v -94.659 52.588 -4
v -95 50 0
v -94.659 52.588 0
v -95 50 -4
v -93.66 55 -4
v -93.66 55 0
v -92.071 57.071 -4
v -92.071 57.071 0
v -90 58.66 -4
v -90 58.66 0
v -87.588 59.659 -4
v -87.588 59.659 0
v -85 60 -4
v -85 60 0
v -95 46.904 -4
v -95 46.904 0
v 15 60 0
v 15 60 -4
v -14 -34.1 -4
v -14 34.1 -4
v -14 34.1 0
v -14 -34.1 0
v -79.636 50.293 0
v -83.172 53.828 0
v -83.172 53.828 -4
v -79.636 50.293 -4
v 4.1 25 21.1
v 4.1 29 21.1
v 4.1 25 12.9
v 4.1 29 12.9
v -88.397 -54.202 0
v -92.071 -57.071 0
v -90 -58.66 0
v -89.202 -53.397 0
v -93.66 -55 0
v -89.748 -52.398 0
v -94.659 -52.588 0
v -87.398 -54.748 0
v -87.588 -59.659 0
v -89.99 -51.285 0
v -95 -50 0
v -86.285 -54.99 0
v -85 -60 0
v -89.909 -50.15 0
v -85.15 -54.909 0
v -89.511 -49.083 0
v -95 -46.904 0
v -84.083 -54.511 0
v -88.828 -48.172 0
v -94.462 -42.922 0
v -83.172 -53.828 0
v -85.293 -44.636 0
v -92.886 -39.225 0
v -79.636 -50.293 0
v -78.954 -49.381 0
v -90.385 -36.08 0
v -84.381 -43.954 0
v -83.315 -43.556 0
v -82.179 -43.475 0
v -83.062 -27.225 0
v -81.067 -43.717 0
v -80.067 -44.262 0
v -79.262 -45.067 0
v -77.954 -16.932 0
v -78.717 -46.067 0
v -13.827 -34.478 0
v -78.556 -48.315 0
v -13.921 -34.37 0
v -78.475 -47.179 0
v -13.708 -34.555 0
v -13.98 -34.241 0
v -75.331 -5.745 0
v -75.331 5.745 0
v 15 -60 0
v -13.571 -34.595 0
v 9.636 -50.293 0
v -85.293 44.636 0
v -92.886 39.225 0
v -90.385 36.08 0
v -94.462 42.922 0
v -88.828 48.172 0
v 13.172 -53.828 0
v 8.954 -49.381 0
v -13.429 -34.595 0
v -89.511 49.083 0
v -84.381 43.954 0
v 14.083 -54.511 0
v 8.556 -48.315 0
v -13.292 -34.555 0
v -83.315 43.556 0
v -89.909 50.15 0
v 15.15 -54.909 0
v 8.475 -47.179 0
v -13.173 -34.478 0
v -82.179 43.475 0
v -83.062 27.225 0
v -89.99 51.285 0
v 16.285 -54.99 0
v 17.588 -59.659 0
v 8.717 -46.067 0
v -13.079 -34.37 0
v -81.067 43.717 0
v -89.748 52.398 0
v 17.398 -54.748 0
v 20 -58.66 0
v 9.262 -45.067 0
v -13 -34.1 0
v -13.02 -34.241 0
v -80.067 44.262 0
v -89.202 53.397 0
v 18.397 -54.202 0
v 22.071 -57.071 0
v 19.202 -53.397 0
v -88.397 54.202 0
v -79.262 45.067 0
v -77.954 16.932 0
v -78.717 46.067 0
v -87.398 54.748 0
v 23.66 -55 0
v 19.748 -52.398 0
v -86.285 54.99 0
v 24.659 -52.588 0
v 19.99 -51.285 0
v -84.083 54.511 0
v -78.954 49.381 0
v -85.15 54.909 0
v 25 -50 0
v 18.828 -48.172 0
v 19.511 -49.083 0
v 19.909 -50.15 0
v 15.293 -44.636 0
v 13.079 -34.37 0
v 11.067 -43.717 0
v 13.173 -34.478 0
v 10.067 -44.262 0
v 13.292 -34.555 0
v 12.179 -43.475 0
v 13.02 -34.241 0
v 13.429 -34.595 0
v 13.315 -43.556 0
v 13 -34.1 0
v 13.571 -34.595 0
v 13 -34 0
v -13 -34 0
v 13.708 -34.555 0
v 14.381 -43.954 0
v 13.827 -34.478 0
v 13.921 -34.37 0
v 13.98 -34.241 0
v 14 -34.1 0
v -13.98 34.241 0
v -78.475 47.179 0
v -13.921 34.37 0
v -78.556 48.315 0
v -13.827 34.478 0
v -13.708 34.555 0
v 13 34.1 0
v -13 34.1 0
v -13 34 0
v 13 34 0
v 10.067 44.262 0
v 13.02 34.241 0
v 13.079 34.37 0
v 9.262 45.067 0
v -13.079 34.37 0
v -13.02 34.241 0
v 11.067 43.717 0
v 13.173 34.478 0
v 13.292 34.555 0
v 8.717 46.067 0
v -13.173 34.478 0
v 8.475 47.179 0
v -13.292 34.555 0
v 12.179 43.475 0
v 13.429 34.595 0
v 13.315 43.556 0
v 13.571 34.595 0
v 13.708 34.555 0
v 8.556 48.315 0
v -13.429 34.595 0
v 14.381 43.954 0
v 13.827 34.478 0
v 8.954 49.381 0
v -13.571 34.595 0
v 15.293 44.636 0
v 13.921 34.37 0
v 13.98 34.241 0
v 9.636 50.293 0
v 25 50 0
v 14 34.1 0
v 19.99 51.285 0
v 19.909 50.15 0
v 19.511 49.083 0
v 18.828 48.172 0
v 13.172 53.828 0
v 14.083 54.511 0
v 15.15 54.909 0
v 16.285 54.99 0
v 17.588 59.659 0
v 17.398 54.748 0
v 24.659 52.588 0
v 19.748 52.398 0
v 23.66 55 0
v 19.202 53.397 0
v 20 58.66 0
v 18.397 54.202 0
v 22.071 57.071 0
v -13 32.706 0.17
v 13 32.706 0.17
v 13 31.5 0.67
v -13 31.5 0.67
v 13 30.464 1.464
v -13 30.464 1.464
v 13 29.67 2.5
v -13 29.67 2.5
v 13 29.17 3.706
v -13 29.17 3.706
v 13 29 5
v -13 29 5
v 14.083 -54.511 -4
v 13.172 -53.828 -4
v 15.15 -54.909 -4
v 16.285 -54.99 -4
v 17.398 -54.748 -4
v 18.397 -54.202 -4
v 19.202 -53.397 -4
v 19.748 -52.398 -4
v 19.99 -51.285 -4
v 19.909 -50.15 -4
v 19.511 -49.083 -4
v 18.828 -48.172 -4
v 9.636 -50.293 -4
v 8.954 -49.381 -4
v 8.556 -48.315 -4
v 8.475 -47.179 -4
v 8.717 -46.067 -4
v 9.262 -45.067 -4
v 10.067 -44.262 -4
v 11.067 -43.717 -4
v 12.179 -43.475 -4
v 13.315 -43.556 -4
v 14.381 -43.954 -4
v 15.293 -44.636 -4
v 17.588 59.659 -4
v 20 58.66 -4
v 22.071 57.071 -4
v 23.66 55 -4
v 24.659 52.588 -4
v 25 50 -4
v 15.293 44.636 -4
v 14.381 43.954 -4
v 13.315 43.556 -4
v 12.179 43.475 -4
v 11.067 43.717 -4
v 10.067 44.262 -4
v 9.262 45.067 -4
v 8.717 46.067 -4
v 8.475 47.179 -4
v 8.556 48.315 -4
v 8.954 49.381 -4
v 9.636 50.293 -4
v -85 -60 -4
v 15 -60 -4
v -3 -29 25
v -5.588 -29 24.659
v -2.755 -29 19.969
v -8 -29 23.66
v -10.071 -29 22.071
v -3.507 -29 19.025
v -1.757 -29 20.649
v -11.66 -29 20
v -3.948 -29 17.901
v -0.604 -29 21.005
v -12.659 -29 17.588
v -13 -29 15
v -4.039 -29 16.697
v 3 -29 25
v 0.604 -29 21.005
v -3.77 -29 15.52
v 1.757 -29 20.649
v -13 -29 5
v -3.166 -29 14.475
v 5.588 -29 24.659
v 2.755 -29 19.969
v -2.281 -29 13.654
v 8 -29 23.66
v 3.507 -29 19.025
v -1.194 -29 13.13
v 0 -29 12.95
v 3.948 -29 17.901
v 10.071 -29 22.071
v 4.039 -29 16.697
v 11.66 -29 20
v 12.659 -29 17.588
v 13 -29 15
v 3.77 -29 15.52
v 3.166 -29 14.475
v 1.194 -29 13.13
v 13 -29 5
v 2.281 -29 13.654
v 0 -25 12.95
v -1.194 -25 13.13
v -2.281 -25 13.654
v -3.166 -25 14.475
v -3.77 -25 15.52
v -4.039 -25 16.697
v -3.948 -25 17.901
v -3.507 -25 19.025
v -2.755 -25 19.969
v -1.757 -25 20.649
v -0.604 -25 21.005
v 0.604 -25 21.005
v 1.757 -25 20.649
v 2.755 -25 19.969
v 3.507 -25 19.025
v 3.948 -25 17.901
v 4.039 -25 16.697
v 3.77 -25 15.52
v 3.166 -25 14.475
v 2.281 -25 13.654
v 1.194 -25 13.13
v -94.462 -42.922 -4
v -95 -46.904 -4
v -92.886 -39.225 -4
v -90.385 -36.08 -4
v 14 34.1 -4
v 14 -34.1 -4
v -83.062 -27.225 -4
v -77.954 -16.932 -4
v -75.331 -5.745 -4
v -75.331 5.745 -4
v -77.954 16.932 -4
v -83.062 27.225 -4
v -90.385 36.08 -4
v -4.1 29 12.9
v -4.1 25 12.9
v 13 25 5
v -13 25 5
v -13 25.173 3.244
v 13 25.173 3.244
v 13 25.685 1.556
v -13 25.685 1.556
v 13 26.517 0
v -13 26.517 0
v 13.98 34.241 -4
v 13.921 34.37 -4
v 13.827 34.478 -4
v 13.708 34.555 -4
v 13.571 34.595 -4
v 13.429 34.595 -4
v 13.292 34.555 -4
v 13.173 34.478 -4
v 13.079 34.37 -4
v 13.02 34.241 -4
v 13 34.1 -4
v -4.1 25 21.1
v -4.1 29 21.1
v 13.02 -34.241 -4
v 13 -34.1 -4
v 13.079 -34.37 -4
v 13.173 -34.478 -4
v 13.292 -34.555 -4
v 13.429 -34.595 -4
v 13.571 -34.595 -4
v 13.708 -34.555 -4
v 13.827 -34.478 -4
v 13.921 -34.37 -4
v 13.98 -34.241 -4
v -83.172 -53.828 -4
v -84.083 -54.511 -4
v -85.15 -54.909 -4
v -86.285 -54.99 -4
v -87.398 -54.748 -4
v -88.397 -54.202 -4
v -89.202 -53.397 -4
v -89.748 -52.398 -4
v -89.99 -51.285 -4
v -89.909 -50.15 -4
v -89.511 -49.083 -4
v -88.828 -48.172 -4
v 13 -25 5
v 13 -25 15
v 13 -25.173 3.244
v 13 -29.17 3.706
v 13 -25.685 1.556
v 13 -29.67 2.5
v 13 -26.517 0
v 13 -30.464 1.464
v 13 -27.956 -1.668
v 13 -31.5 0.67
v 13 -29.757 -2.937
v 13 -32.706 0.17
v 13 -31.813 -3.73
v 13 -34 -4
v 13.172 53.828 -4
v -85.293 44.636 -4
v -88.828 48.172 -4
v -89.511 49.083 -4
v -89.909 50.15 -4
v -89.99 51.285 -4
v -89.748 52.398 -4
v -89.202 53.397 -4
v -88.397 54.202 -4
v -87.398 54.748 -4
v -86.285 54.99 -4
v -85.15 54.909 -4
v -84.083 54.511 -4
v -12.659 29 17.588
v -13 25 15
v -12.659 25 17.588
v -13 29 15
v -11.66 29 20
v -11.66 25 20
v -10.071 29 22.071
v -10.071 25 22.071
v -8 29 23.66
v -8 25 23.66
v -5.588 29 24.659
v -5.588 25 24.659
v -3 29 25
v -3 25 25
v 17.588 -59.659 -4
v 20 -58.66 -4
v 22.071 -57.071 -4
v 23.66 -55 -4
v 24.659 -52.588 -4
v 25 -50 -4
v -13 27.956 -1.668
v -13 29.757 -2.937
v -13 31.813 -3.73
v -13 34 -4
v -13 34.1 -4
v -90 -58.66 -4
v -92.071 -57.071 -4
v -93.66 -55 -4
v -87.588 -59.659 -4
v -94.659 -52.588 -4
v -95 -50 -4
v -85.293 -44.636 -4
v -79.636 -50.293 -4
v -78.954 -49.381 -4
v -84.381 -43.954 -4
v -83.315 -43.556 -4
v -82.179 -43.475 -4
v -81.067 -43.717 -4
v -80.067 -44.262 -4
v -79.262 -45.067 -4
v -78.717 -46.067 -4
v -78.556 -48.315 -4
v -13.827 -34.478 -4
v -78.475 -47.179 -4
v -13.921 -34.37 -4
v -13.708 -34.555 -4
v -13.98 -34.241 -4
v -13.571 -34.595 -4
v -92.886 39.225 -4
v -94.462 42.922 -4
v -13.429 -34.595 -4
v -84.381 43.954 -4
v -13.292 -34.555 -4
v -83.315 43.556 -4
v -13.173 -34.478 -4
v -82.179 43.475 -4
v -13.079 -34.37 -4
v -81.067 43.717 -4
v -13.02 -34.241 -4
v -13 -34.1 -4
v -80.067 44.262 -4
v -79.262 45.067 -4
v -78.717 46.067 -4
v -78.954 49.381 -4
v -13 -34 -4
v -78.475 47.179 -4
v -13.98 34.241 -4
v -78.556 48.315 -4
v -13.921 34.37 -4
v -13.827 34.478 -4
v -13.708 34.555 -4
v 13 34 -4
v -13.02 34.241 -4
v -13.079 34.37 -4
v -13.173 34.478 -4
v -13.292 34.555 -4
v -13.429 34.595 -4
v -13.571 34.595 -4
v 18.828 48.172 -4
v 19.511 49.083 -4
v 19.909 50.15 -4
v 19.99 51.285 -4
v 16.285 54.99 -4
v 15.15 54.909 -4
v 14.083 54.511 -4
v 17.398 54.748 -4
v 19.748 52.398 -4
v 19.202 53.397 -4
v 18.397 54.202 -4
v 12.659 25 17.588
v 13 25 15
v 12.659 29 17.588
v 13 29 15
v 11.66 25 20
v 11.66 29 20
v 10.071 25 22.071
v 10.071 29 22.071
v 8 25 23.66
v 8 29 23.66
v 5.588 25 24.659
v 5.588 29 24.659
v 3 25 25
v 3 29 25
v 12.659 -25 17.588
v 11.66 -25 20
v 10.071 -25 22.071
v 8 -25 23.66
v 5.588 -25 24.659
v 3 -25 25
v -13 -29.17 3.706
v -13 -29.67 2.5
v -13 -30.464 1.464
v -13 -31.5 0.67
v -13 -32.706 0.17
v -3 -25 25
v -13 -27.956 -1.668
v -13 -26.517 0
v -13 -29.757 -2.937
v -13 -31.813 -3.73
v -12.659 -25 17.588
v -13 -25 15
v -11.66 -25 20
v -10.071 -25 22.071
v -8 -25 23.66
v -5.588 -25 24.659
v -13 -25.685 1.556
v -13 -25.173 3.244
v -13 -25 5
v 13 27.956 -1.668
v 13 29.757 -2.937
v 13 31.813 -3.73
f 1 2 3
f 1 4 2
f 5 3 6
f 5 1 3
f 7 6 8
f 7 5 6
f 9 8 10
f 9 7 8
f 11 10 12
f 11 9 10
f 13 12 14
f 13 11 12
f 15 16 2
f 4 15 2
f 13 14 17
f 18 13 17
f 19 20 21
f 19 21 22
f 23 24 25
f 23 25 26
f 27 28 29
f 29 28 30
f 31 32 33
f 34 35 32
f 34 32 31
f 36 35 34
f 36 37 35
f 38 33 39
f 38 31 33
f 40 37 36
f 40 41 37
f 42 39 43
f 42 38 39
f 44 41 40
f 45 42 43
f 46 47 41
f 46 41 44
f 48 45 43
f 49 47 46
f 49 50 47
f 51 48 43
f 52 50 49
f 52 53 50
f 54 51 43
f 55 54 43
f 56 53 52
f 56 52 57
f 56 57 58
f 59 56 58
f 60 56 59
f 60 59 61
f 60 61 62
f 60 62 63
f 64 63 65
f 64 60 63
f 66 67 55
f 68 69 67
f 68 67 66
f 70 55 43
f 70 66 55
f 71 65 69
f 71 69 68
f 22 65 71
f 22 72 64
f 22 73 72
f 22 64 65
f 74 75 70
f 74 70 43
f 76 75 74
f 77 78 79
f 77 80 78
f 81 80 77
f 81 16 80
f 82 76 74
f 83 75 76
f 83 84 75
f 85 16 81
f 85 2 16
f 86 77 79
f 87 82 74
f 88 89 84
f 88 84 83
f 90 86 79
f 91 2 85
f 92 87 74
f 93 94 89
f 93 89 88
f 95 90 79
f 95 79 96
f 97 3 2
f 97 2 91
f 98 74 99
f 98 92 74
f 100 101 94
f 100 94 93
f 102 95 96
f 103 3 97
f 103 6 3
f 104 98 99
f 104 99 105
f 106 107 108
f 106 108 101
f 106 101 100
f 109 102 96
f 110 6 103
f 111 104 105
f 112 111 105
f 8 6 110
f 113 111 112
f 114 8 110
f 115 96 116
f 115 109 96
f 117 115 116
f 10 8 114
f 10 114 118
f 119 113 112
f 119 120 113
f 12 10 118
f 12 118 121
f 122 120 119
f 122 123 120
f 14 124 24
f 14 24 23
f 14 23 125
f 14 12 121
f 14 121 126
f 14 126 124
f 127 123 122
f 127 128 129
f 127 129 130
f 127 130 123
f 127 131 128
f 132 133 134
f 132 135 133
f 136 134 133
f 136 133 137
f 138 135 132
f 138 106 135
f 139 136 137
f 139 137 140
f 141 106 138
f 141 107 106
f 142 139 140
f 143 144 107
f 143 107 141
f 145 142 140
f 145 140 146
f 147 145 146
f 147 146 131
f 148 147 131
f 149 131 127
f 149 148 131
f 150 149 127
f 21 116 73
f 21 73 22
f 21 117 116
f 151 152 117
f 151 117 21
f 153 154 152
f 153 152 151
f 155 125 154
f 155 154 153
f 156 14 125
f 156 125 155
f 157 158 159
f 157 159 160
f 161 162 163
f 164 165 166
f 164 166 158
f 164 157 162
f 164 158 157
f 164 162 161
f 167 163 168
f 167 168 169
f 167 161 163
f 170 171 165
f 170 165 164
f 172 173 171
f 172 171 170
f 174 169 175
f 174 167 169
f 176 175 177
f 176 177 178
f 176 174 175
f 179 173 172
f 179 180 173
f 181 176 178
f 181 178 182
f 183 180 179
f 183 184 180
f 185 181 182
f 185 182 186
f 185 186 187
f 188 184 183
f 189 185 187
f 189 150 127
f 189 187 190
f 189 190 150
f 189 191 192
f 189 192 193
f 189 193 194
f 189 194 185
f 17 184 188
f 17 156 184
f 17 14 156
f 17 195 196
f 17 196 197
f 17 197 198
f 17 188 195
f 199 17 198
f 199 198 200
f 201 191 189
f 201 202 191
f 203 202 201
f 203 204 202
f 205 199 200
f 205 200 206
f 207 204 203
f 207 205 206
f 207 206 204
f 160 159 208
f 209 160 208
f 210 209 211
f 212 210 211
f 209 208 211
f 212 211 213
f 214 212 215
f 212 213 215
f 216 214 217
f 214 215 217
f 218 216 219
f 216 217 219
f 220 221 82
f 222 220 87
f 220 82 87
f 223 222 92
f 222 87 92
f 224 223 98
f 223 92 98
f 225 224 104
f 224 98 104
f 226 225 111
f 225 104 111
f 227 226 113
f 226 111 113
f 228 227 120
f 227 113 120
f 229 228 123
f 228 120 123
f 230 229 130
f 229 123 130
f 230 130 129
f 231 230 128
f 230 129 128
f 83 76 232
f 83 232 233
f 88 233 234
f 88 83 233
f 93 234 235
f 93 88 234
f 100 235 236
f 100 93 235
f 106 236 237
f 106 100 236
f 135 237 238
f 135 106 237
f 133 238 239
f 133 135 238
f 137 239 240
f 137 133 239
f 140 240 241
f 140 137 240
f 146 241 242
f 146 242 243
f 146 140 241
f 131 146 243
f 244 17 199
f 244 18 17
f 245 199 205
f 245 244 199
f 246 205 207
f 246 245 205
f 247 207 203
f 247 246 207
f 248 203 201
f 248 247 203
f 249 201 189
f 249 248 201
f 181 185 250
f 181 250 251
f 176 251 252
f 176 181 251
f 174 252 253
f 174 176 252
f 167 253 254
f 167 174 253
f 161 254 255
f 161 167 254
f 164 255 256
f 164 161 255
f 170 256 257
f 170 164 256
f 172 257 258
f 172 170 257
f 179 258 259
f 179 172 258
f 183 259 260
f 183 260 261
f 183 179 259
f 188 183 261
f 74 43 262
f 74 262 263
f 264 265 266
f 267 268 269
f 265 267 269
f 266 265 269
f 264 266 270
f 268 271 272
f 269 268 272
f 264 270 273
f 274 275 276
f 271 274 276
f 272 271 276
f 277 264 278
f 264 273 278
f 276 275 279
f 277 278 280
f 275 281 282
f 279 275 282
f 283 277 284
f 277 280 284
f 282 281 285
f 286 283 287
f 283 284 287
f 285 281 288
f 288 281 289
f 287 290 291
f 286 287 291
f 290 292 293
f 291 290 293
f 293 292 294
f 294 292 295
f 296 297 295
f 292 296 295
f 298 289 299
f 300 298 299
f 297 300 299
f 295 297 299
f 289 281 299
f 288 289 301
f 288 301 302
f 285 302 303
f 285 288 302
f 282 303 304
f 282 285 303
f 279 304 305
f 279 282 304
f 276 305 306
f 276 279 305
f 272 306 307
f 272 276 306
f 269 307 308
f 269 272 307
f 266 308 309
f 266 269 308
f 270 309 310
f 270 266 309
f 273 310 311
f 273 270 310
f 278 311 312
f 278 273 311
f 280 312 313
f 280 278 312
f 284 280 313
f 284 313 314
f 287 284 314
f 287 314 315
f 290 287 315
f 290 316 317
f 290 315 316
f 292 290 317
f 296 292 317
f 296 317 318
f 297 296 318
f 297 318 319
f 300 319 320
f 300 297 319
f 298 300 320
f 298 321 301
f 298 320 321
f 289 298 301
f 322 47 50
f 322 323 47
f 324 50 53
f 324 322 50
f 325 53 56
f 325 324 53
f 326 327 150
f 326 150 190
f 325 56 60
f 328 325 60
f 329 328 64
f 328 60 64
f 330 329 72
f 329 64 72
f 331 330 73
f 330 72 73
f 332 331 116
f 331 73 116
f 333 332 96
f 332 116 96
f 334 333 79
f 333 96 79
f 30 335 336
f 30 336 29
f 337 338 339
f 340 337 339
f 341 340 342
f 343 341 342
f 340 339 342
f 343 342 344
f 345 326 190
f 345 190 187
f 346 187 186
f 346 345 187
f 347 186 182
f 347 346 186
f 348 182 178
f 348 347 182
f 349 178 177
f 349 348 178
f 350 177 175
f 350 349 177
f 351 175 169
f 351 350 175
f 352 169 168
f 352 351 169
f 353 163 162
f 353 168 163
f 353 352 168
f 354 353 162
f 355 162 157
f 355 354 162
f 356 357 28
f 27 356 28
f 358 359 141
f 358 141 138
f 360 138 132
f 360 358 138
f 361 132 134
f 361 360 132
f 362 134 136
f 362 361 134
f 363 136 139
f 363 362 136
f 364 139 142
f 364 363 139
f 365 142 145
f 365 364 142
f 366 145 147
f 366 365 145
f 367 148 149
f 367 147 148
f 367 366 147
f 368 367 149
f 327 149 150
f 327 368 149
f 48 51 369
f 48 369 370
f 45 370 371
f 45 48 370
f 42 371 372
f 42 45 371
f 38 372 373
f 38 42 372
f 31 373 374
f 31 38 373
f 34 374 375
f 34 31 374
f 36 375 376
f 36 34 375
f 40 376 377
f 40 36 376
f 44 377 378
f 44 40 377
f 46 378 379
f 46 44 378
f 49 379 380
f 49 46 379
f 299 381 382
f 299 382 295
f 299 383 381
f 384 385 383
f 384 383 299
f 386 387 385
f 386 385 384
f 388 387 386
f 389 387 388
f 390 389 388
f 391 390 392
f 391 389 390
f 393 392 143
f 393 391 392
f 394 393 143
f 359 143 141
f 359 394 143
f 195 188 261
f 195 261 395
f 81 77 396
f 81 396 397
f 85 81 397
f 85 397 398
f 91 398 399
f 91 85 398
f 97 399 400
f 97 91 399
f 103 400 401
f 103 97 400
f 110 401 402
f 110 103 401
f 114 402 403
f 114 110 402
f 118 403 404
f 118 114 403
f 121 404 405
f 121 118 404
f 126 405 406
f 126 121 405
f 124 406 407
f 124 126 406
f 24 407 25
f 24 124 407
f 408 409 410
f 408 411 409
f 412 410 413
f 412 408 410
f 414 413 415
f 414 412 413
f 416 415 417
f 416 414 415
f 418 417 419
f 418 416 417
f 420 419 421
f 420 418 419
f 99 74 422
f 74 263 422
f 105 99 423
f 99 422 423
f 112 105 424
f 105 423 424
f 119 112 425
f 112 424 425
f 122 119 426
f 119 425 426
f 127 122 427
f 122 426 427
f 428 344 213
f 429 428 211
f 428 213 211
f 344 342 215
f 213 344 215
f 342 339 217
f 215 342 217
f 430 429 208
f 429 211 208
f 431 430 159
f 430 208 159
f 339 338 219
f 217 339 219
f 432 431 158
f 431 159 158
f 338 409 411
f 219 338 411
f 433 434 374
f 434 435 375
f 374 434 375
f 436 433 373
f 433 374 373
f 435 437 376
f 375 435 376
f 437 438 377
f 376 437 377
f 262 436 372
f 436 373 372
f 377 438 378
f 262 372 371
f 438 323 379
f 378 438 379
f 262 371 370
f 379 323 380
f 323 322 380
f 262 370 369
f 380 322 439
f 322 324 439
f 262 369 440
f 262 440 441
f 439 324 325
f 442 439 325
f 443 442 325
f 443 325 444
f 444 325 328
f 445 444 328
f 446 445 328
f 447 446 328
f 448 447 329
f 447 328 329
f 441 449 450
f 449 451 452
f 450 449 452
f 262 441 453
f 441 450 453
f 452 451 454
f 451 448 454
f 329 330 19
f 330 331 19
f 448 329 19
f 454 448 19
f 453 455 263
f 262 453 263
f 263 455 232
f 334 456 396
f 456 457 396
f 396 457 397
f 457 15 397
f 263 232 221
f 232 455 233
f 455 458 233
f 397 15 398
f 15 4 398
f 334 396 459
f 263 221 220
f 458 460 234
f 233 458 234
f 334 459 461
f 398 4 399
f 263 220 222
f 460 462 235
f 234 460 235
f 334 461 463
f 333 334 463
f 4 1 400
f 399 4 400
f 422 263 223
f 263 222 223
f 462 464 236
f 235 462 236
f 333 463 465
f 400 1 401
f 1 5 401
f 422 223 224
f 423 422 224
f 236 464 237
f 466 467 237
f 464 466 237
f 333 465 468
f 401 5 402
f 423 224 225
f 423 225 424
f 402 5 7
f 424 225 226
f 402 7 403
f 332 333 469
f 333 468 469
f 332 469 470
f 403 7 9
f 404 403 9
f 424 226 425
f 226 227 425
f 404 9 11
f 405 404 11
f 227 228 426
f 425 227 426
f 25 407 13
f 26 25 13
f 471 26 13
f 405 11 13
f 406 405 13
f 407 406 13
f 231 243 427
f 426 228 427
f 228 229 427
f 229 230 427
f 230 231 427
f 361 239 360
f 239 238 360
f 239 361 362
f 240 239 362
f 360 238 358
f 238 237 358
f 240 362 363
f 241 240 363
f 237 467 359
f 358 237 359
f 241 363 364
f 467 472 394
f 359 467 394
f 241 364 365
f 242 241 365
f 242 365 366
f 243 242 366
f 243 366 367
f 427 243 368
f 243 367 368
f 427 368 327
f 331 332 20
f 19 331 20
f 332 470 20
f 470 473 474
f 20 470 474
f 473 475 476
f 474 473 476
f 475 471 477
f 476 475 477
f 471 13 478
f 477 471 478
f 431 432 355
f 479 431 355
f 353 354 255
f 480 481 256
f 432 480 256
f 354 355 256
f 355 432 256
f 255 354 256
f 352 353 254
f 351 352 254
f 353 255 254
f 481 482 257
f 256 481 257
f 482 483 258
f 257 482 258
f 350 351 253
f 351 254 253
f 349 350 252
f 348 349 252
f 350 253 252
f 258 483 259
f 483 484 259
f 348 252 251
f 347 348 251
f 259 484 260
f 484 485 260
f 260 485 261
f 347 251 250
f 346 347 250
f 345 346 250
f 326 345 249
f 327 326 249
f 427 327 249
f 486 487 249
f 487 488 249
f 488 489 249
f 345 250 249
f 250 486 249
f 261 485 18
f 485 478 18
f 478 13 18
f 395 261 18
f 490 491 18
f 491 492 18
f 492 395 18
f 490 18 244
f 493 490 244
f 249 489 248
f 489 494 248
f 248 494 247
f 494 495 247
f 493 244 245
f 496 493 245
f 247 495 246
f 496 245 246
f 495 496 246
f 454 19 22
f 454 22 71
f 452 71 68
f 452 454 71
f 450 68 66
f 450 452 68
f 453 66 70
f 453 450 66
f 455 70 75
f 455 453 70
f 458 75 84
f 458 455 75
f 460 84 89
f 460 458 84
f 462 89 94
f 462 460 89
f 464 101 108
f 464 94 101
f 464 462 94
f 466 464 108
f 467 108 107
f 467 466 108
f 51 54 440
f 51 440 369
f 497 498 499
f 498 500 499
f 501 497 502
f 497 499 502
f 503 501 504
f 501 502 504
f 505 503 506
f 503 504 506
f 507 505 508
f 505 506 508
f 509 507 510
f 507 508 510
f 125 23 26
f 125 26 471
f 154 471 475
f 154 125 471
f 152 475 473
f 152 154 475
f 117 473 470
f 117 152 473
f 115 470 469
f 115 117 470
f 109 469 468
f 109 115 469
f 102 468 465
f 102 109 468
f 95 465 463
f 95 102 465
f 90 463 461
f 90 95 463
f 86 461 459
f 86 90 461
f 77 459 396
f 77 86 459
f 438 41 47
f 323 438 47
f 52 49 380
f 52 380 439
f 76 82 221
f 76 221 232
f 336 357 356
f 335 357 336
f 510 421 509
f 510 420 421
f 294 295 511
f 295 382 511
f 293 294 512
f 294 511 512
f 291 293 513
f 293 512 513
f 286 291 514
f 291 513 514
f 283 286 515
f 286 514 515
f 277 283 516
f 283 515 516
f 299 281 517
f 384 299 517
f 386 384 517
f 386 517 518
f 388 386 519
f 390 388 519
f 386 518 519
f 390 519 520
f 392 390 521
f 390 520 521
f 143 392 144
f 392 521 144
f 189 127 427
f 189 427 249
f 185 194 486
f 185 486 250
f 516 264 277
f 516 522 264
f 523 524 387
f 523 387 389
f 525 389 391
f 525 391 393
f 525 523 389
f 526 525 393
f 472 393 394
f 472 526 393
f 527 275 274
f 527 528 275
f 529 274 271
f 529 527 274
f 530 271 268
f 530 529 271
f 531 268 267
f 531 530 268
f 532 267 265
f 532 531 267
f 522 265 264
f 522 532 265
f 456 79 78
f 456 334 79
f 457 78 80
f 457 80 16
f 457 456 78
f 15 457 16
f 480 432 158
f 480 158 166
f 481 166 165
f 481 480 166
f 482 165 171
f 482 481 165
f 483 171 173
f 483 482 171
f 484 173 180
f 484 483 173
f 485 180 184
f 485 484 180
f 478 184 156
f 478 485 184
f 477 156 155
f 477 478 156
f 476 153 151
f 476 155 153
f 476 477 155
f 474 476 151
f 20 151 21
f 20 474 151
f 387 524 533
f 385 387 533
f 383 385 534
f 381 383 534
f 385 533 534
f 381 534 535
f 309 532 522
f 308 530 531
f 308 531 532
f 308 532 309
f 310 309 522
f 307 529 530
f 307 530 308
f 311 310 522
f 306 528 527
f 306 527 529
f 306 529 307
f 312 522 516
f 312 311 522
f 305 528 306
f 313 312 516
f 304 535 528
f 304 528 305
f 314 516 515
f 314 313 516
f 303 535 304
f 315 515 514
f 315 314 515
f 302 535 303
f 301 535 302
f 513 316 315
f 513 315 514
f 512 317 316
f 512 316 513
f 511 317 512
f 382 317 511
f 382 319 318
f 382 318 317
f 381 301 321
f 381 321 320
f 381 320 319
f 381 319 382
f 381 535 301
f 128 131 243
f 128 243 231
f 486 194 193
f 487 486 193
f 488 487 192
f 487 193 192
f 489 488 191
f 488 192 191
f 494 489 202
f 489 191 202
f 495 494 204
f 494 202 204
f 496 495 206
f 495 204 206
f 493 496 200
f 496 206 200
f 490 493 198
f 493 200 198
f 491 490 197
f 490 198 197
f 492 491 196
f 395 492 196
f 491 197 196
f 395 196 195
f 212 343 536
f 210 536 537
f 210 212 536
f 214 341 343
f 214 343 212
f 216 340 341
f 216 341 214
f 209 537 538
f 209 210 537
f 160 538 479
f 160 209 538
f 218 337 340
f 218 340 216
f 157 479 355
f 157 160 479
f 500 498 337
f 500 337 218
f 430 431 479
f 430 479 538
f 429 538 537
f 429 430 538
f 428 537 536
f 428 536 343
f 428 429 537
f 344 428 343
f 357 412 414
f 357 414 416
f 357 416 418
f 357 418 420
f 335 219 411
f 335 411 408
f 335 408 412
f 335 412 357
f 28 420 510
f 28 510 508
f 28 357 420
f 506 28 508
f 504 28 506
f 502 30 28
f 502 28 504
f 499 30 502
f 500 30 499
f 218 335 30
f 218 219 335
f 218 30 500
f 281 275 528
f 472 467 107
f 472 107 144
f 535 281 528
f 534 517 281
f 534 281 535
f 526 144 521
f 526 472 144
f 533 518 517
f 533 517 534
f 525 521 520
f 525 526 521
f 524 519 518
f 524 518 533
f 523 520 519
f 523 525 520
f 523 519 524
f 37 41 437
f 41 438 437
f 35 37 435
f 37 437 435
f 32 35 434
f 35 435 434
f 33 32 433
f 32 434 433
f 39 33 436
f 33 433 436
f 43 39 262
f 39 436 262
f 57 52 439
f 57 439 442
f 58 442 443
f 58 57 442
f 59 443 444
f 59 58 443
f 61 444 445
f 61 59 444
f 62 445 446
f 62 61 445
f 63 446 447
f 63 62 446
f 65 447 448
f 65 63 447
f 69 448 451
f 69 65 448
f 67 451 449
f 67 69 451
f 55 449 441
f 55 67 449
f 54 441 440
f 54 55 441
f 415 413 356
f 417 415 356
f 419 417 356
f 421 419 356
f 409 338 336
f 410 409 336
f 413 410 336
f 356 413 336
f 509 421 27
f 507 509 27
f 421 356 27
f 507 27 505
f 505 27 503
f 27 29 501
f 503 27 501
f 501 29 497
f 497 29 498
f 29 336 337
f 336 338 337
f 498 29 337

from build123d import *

# Parameters (mm, degrees)
SKETCH_1_W           = 120
SKETCH_1_H           = 120
SKETCH_1_W_2         = 28
SKETCH_1_H_2         = 50
BASE_PLATE_DEPTH     = 4
TABS2_START          = -5
TABS2_DEPTH          = 10
TABS2_2_OUTLINE_W    = 26
TABS2_2_OUTLINE_H    = 4
TABS2_2_DEPTH        = 1.41096
TABS2_START_2        = 5
TABS2_3_OUTLINE_W    = 26
TABS2_3_OUTLINE_H    = 4
TABS2_3_DEPTH        = 20
TABS2_START_3        = -13
TABS2_4_DEPTH        = 26
TABS2_5_DEPTH        = 26
HOLE1_DEPTH          = 116.108644332
HOLE1_DEPTH_BACK     = 116.108644332
SKETCH_10_R          = 4.05
SKETCH_12_W          = 8.2
SKETCH_12_H          = 8.2
HOLE2_DEPTH          = 4
FILLETS_R            = 10
SKETCH_11_R          = 4
OBLONG_HOLES_DEPTH   = 4
OBLONG_HOLES_2_DEPTH = 4
FILLETS2_DEPTH       = 4
FILLETS3_R           = 15


with BuildPart() as part:
    # Base Plate: sheet metal written as solids
    # Sketch 1 → Base Plate (new body)
    with BuildSketch(Plane.XY):
        with Locations((-35, 0)):
            Rectangle(SKETCH_1_W, SKETCH_1_H)
        Rectangle(SKETCH_1_W_2, SKETCH_1_H_2, mode=Mode.SUBTRACT)
    extrude(amount=-BASE_PLATE_DEPTH)

    # Tabs2: read off the stored shape, not the designer's step
    # Tabs2 outline → Tabs2 (cut)
    with BuildSketch(Plane.XY.offset(TABS2_START)):
        with BuildLine():
            ThreePointArc((-13, 34.1), (-13.5, 34.6), (-14, 34.1))
            Line((-14, 34.1), (-14, 25))
            Line((-14, 25), (-13, 25))
            Line((-13, 25), (-13, 34.1))
        make_face()
        with BuildLine():
            Line((-13, -25), (-14, -25))
            Line((-14, -25), (-14, -34.1))
            ThreePointArc((-14, -34.1), (-13.5, -34.6), (-13, -34.1))
            Line((-13, -34.1), (-13, -25))
        make_face()
        with BuildLine():
            Line((13, 34.1), (13, 25))
            Line((13, 25), (14, 25))
            Line((14, 25), (14, 34.1))
            ThreePointArc((14, 34.1), (13.5, 34.6), (13, 34.1))
        make_face()
        with BuildLine():
            Line((14, -25), (13, -25))
            Line((13, -25), (13, -34.1))
            ThreePointArc((13, -34.1), (13.5, -34.6), (14, -34.1))
            Line((14, -34.1), (14, -25))
        make_face()
    extrude(amount=TABS2_DEPTH, mode=Mode.SUBTRACT)

    # Tabs2 2 outline → Tabs2 2 (cut)
    with BuildSketch(Plane.XY.offset(TABS2_START)):
        with Locations((0, 27)):
            Rectangle(TABS2_2_OUTLINE_W, TABS2_2_OUTLINE_H)
        with Locations((0, -27)):
            Rectangle(TABS2_2_OUTLINE_W, TABS2_2_OUTLINE_H)
    extrude(amount=TABS2_2_DEPTH, mode=Mode.SUBTRACT)

    # Tabs2 4 outline → Tabs2 4 (cut)
    with BuildSketch(Plane.YZ.offset(TABS2_START_3)):
        with BuildLine():
            ThreePointArc((34, -4), (29.757359313, -2.937253933), (26.516685226, 0))
            Line((26.516685226, 0), (25, 0))
            Line((25, 0), (25, -3.58904))
            Line((25, -3.58904), (29, -3.58904))
            Line((29, -3.58904), (29, -4))
            Line((29, -4), (34, -4))
        make_face()
        with BuildLine():
            Line((-25, -3.58904), (-25, 0))
            Line((-25, 0), (-26.516685226, 0))
            ThreePointArc((-26.516685226, 0), (-29.757359313, -2.937253933), (-34, -4))
            Line((-34, -4), (-29, -4))
            Line((-29, -4), (-29, -3.58904))
            Line((-29, -3.58904), (-25, -3.58904))
        make_face()
    extrude(amount=TABS2_4_DEPTH, mode=Mode.SUBTRACT)



with BuildPart() as body_2:
    # Tabs2 3 outline → Tabs2 3 (new body)
    with BuildSketch(Plane.XY.offset(TABS2_START_2)):
        with Locations((0, 27)):
            Rectangle(TABS2_3_OUTLINE_W, TABS2_3_OUTLINE_H)
        with Locations((0, -27)):
            Rectangle(TABS2_3_OUTLINE_W, TABS2_3_OUTLINE_H)
    extrude(amount=TABS2_3_DEPTH)


with BuildPart() as part_1:
    add(part.part)

    add(body_2.part)  # Tabs2 5 merges body 2
    # Tabs2 5 outline → Tabs2 5 (add)
    with BuildSketch(Plane.YZ.offset(TABS2_START_3)):
        with BuildLine():
            Line((29, 5), (25, 5))
            ThreePointArc((25, 5), (25.38751392, 2.38751392), (26.516685226, 0))
            Line((26.516685226, 0), (34, 0))
            ThreePointArc((34, 0), (30.464466094, 1.464466094), (29, 5))
        make_face()
        with BuildLine():
            Line((-34, 0), (-26.516685226, 0))
            ThreePointArc((-26.516685226, 0), (-25.38751392, 2.38751392), (-25, 5))
            Line((-25, 5), (-29, 5))
            ThreePointArc((-29, 5), (-30.464466094, 1.464466094), (-34, 0))
        make_face()
    extrude(amount=TABS2_5_DEPTH)

    # Эскиз10 → Hole1 (cut, two sides: drawn at the far end of the back side and taken through both)
    with BuildSketch(Plane(origin=(0, 0, 0), x_dir=(1, 0, 0), z_dir=(0, 1, 0)).offset(-HOLE1_DEPTH_BACK)):
        with Locations(Location((0, -17, 0), (0, 0, 90))):
            Circle(SKETCH_10_R)
    extrude(amount=HOLE1_DEPTH + HOLE1_DEPTH_BACK, mode=Mode.SUBTRACT)

    # Эскиз12 → Hole2 (cut)
    with BuildSketch(Plane(origin=(0, 29, 0), x_dir=(1, 0, 0), z_dir=(0, 1, 0))):
        with Locations((0, -17)):
            Rectangle(SKETCH_12_W, SKETCH_12_H)
    extrude(amount=-HOLE2_DEPTH, mode=Mode.SUBTRACT)

    # Fillets
    fillets_edges = [part_1.edges().sort_by_distance(p)[0] for p in [
        (13, -27, 25),
        (-13, -27, 25),
        (-95, 60, -2),
        (25, 60, -2),
        (25, -60, -2),
        (-95, -60, -2),
        (-13, 27, 25),
        (13, 27, 25),
    ]]
    fillet(fillets_edges, radius=FILLETS_R)

    # Эскиз11 → Oblong Holes (cut)
    with BuildSketch(Plane.XY):
        with Locations((-86, 51)):
            Circle(SKETCH_11_R)
        with Locations((16, 51)):
            Circle(SKETCH_11_R)
        with Locations((-86, -51)):
            Circle(SKETCH_11_R)
        with Locations((16, -51)):
            Circle(SKETCH_11_R)
    extrude(amount=-OBLONG_HOLES_DEPTH, mode=Mode.SUBTRACT)

    # Эскиз13 → oblong Holes 2 (cut)
    with BuildSketch(Plane.XY):
        with BuildLine():
            Line((-83.171572875, 53.828427125), (-79.636038969, 50.292893219))
            ThreePointArc((-79.636038969, 50.292893219), (-79.636038969, 44.636038969), (-85.292893219, 44.636038969))
            Line((-85.292893219, 44.636038969), (-88.828427125, 48.171572875))
            ThreePointArc((-88.828427125, 48.171572875), (-88.828427125, 53.828427125), (-83.171572875, 53.828427125))
        make_face()
        with BuildLine():
            Line((18.828427125, 48.171572875), (15.292893219, 44.636038969))
            ThreePointArc((15.292893219, 44.636038969), (9.636038969, 44.636038969), (9.636038969, 50.292893219))
            Line((9.636038969, 50.292893219), (13.171572875, 53.828427125))
            ThreePointArc((13.171572875, 53.828427125), (18.828427125, 53.828427125), (18.828427125, 48.171572875))
        make_face()
        with BuildLine():
            Line((-88.828427125, -48.171572875), (-85.292893219, -44.636038969))
            ThreePointArc((-85.292893219, -44.636038969), (-79.636038969, -44.636038969), (-79.636038969, -50.292893219))
            Line((-79.636038969, -50.292893219), (-83.171572875, -53.828427125))
            ThreePointArc((-83.171572875, -53.828427125), (-88.828427125, -53.828427125), (-88.828427125, -48.171572875))
        make_face()
        with BuildLine():
            Line((13.171572875, -53.828427125), (9.636038969, -50.292893219))
            ThreePointArc((9.636038969, -50.292893219), (9.636038969, -44.636038969), (15.292893219, -44.636038969))
            Line((15.292893219, -44.636038969), (18.828427125, -48.171572875))
            ThreePointArc((18.828427125, -48.171572875), (18.828427125, -53.828427125), (13.171572875, -53.828427125))
        make_face()
    extrude(amount=-OBLONG_HOLES_2_DEPTH, mode=Mode.SUBTRACT)

    # Эскиз14 → Fillets2 (cut)
    with BuildSketch(Plane.XY):
        with BuildLine():
            Line((-95, 40), (-95, -40))
            ThreePointArc((-95, -40), (-75, 0), (-95, 40))
        make_face()
    extrude(amount=-FILLETS2_DEPTH, mode=Mode.SUBTRACT)

    # Fillets3
    fillets3_edges = [part_1.edges().sort_by_distance(p)[0] for p in [
        (-95, 40, -2),
        (-95, -40, -2),
    ]]
    fillet(fillets3_edges, radius=FILLETS3_R)


solid = part_1.part
